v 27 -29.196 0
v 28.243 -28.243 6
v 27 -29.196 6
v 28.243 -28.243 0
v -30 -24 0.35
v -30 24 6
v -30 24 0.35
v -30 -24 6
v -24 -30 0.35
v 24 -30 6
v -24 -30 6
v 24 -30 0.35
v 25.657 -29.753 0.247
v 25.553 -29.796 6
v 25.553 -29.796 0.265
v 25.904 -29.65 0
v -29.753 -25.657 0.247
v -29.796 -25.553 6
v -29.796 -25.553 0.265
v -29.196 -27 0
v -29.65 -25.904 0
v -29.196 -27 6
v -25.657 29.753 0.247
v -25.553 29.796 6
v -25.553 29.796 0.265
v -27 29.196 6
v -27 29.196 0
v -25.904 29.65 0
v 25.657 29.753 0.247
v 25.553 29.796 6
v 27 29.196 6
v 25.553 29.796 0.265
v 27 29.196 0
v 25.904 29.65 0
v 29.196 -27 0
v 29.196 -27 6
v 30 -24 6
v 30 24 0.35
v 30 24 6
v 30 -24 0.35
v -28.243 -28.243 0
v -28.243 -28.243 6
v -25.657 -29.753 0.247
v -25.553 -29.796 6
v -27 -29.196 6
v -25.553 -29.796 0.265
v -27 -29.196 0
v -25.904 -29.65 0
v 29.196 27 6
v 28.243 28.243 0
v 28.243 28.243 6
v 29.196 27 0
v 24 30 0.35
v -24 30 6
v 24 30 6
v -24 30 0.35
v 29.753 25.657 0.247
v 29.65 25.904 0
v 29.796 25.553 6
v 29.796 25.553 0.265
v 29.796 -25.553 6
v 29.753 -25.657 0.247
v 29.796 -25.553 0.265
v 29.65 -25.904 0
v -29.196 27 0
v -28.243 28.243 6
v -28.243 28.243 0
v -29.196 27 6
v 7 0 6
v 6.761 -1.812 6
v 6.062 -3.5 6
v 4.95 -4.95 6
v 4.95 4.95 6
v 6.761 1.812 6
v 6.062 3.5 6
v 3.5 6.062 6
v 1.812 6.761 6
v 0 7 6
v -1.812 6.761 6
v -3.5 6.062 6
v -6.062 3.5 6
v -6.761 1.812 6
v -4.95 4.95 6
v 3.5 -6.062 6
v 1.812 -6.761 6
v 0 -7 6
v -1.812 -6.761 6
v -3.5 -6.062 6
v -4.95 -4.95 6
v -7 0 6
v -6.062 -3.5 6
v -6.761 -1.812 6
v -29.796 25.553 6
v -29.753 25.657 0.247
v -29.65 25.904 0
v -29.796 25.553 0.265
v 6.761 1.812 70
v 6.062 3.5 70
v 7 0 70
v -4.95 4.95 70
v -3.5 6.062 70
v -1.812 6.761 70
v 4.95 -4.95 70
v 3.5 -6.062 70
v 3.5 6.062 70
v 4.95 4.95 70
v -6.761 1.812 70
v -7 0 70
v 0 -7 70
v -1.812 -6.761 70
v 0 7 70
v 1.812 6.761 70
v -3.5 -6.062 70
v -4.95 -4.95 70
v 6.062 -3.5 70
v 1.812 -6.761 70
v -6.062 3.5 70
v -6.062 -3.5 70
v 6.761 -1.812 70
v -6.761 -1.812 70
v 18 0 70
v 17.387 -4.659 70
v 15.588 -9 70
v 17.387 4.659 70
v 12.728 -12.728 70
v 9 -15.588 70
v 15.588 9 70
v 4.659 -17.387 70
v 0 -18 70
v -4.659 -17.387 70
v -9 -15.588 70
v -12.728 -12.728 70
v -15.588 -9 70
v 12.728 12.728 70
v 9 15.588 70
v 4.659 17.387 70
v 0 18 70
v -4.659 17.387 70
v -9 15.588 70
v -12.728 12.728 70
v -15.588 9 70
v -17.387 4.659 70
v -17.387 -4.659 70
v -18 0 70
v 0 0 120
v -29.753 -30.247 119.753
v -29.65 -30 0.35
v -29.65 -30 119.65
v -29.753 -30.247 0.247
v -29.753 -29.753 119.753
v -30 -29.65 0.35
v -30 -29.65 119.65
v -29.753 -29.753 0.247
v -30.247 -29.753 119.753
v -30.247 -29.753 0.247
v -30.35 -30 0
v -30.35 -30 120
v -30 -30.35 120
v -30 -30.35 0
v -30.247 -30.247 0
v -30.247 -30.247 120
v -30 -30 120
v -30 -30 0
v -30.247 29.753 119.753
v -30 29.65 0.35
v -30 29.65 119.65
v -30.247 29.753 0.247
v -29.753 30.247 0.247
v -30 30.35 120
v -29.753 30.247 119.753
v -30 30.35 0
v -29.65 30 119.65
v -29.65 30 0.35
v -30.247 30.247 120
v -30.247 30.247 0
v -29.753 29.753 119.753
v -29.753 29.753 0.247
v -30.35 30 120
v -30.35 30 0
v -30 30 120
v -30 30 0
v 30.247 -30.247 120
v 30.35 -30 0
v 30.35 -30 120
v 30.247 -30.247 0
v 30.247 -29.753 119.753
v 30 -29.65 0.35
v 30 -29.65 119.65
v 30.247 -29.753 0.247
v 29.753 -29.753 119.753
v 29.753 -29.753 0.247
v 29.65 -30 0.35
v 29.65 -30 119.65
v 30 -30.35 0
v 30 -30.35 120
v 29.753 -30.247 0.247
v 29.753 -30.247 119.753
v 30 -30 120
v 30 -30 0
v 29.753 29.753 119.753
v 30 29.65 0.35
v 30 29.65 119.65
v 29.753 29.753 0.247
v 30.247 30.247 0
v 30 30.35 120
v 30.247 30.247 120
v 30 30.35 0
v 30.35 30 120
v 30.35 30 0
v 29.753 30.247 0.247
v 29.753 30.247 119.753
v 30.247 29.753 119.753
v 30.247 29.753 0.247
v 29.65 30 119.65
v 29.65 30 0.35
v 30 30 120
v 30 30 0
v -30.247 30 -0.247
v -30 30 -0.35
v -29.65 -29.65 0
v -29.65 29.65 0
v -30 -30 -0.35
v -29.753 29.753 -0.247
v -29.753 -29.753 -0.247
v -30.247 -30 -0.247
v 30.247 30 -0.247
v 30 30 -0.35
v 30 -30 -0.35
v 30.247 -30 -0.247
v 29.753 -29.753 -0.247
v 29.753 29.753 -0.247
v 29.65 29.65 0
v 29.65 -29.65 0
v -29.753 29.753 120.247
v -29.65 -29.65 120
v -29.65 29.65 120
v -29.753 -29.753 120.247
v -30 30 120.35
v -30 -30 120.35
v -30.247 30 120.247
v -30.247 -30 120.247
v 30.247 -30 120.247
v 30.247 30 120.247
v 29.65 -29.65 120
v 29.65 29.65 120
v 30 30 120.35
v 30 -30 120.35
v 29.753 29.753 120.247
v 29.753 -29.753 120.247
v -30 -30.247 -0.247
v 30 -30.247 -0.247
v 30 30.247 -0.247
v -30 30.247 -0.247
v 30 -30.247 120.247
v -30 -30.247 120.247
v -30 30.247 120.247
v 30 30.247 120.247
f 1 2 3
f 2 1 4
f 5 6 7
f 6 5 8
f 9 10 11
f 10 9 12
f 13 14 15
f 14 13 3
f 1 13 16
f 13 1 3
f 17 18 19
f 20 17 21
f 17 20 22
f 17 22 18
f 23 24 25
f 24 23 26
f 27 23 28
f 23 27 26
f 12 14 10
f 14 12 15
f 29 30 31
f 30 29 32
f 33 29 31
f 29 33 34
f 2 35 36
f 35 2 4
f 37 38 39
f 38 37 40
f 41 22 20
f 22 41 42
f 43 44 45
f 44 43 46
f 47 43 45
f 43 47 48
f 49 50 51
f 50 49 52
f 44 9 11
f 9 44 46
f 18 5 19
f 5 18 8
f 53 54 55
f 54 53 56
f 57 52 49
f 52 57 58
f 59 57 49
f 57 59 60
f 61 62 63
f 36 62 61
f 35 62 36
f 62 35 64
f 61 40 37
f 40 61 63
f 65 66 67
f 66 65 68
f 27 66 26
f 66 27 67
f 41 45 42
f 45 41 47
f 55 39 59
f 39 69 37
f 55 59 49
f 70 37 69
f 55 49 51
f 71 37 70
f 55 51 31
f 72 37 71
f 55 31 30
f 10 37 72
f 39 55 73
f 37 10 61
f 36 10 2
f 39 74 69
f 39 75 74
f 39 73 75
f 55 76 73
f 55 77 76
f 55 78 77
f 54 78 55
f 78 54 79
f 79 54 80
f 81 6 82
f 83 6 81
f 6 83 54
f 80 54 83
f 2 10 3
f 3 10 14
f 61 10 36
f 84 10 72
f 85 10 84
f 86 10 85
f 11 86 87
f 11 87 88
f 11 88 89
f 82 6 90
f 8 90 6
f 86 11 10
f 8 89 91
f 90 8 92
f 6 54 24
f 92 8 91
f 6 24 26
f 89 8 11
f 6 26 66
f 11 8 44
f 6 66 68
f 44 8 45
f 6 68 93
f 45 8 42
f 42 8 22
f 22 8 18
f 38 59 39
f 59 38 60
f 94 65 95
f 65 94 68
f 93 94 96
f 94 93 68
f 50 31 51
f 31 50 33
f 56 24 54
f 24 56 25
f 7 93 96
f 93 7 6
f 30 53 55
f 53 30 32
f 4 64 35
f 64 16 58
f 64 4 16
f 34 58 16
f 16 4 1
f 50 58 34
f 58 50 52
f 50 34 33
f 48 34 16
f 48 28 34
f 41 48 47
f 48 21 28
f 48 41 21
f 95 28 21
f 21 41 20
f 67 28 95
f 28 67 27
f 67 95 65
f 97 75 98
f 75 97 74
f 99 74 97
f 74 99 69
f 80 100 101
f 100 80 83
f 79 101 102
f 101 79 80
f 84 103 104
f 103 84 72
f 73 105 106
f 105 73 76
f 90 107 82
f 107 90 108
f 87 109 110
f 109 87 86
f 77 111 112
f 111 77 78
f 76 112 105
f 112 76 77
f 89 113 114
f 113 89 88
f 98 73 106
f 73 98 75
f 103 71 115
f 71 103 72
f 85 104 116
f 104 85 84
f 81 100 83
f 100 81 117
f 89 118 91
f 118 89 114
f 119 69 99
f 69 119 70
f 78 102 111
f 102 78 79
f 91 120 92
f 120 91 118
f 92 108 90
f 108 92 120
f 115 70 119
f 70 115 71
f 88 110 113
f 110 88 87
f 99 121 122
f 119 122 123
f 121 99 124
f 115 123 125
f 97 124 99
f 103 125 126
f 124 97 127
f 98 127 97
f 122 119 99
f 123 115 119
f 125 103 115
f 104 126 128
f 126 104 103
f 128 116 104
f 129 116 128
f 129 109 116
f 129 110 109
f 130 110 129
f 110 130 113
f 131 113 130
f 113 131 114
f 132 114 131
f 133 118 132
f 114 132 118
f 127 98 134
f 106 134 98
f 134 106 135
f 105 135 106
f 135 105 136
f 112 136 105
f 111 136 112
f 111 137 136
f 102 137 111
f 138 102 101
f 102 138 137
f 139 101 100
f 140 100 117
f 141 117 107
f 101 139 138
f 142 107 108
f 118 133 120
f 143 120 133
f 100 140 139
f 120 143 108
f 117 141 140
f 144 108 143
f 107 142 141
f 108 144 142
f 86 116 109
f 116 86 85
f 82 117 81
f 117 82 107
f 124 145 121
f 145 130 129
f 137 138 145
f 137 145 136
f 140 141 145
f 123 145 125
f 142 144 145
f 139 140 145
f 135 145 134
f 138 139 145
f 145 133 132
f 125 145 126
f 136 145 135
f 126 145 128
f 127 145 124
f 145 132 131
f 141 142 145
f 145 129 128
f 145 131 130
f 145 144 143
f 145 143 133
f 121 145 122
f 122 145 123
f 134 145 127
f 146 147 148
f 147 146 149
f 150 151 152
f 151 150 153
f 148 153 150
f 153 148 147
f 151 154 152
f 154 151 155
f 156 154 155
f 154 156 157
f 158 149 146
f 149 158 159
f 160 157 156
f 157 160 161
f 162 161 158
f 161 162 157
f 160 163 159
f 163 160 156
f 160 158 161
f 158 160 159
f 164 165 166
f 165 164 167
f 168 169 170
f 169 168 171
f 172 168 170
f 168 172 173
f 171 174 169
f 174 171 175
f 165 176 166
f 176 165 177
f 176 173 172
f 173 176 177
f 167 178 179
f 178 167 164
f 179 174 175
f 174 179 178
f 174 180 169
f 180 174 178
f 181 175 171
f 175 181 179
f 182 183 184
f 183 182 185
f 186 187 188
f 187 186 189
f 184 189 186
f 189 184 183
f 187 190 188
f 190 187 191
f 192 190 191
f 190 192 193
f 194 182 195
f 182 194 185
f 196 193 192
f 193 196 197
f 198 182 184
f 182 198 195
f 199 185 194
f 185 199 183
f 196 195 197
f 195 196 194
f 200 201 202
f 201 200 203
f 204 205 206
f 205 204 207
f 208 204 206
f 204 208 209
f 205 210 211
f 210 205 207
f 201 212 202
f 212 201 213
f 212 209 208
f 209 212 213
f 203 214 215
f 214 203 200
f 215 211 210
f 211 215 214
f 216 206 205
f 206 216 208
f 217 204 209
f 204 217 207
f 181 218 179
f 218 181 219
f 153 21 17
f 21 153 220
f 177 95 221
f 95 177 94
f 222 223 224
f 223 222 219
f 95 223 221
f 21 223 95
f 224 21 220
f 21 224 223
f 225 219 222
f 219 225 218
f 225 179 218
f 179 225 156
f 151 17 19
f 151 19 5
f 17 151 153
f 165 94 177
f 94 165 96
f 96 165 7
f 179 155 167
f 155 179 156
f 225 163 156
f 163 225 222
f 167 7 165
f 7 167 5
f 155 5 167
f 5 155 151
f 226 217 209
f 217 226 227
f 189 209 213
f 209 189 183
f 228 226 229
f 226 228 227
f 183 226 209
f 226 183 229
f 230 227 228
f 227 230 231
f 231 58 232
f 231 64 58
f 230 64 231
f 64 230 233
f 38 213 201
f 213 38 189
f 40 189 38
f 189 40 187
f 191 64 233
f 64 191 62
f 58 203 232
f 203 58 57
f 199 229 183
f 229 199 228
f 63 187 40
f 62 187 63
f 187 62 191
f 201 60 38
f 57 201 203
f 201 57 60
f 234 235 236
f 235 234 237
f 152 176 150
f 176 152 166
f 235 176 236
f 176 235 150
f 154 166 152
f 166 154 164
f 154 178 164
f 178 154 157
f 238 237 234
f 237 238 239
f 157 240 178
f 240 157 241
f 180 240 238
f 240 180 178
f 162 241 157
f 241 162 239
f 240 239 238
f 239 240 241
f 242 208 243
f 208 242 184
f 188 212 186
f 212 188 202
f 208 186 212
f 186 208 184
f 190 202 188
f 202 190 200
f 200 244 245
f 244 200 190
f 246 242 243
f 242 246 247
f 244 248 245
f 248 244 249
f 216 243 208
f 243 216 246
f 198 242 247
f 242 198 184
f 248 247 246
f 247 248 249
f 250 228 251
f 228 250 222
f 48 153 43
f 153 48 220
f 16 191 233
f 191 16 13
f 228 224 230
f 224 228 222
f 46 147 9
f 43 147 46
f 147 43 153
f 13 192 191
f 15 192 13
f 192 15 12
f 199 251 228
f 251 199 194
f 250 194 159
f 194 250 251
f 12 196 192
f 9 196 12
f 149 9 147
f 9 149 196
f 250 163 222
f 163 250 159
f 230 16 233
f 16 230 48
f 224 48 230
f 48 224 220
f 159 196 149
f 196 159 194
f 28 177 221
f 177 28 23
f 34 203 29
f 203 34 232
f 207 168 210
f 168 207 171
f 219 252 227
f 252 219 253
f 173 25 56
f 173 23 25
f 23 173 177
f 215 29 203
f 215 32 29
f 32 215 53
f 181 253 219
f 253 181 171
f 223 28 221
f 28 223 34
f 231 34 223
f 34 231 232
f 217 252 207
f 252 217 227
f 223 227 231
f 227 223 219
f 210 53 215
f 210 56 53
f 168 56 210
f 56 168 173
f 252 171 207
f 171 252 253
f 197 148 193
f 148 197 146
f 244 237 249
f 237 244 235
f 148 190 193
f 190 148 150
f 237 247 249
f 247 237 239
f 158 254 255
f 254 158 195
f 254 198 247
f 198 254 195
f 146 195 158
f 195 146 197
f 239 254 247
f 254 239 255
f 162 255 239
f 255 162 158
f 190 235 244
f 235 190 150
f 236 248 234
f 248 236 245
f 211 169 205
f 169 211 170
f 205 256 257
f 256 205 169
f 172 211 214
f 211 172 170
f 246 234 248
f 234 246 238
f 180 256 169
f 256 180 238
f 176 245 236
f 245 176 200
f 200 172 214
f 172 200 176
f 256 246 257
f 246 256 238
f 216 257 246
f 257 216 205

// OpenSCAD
// file: emitter_arrow.scad
// Dimensions in millimetres; +Z is the ejection direction.
foot_size=60; corner_radius=6; foot_thickness=6;
shaft_diameter=14; shaft_top=70; head_diameter=36; height=120;
$fn=24;
module foot() { linear_extrude(height=foot_thickness) offset(r=corner_radius) square([foot_size-2*corner_radius,foot_size-2*corner_radius],center=true); }
module shaft() { translate([0,0,foot_thickness]) cylinder(d=shaft_diameter,h=shaft_top-foot_thickness); }
module head() { translate([0,0,shaft_top]) cylinder(d1=head_diameter,d2=0,h=height-shaft_top); }
module arrow() { union() { foot(); shaft(); head(); } }
if (is_undef(colored) || !colored) arrow();
else { color("#8E9296") { foot(); shaft(); } color("#DC9E33") head(); }
// main file
use <emitter_arrow.scad>
arrow();
color("yellow") {
 for(x=[-30,30],y=[-30,30]) translate([x,y,0]) cylinder(h=120,r=0.35,$fn=8);
 for(z=[0,120],x=[-30,30]) translate([x,-30,z]) rotate([-90,0,0]) cylinder(h=60,r=0.35,$fn=8);
 for(z=[0,120],y=[-30,30]) translate([-30,y,z]) rotate([0,90,0]) cylinder(h=60,r=0.35,$fn=8);
}
